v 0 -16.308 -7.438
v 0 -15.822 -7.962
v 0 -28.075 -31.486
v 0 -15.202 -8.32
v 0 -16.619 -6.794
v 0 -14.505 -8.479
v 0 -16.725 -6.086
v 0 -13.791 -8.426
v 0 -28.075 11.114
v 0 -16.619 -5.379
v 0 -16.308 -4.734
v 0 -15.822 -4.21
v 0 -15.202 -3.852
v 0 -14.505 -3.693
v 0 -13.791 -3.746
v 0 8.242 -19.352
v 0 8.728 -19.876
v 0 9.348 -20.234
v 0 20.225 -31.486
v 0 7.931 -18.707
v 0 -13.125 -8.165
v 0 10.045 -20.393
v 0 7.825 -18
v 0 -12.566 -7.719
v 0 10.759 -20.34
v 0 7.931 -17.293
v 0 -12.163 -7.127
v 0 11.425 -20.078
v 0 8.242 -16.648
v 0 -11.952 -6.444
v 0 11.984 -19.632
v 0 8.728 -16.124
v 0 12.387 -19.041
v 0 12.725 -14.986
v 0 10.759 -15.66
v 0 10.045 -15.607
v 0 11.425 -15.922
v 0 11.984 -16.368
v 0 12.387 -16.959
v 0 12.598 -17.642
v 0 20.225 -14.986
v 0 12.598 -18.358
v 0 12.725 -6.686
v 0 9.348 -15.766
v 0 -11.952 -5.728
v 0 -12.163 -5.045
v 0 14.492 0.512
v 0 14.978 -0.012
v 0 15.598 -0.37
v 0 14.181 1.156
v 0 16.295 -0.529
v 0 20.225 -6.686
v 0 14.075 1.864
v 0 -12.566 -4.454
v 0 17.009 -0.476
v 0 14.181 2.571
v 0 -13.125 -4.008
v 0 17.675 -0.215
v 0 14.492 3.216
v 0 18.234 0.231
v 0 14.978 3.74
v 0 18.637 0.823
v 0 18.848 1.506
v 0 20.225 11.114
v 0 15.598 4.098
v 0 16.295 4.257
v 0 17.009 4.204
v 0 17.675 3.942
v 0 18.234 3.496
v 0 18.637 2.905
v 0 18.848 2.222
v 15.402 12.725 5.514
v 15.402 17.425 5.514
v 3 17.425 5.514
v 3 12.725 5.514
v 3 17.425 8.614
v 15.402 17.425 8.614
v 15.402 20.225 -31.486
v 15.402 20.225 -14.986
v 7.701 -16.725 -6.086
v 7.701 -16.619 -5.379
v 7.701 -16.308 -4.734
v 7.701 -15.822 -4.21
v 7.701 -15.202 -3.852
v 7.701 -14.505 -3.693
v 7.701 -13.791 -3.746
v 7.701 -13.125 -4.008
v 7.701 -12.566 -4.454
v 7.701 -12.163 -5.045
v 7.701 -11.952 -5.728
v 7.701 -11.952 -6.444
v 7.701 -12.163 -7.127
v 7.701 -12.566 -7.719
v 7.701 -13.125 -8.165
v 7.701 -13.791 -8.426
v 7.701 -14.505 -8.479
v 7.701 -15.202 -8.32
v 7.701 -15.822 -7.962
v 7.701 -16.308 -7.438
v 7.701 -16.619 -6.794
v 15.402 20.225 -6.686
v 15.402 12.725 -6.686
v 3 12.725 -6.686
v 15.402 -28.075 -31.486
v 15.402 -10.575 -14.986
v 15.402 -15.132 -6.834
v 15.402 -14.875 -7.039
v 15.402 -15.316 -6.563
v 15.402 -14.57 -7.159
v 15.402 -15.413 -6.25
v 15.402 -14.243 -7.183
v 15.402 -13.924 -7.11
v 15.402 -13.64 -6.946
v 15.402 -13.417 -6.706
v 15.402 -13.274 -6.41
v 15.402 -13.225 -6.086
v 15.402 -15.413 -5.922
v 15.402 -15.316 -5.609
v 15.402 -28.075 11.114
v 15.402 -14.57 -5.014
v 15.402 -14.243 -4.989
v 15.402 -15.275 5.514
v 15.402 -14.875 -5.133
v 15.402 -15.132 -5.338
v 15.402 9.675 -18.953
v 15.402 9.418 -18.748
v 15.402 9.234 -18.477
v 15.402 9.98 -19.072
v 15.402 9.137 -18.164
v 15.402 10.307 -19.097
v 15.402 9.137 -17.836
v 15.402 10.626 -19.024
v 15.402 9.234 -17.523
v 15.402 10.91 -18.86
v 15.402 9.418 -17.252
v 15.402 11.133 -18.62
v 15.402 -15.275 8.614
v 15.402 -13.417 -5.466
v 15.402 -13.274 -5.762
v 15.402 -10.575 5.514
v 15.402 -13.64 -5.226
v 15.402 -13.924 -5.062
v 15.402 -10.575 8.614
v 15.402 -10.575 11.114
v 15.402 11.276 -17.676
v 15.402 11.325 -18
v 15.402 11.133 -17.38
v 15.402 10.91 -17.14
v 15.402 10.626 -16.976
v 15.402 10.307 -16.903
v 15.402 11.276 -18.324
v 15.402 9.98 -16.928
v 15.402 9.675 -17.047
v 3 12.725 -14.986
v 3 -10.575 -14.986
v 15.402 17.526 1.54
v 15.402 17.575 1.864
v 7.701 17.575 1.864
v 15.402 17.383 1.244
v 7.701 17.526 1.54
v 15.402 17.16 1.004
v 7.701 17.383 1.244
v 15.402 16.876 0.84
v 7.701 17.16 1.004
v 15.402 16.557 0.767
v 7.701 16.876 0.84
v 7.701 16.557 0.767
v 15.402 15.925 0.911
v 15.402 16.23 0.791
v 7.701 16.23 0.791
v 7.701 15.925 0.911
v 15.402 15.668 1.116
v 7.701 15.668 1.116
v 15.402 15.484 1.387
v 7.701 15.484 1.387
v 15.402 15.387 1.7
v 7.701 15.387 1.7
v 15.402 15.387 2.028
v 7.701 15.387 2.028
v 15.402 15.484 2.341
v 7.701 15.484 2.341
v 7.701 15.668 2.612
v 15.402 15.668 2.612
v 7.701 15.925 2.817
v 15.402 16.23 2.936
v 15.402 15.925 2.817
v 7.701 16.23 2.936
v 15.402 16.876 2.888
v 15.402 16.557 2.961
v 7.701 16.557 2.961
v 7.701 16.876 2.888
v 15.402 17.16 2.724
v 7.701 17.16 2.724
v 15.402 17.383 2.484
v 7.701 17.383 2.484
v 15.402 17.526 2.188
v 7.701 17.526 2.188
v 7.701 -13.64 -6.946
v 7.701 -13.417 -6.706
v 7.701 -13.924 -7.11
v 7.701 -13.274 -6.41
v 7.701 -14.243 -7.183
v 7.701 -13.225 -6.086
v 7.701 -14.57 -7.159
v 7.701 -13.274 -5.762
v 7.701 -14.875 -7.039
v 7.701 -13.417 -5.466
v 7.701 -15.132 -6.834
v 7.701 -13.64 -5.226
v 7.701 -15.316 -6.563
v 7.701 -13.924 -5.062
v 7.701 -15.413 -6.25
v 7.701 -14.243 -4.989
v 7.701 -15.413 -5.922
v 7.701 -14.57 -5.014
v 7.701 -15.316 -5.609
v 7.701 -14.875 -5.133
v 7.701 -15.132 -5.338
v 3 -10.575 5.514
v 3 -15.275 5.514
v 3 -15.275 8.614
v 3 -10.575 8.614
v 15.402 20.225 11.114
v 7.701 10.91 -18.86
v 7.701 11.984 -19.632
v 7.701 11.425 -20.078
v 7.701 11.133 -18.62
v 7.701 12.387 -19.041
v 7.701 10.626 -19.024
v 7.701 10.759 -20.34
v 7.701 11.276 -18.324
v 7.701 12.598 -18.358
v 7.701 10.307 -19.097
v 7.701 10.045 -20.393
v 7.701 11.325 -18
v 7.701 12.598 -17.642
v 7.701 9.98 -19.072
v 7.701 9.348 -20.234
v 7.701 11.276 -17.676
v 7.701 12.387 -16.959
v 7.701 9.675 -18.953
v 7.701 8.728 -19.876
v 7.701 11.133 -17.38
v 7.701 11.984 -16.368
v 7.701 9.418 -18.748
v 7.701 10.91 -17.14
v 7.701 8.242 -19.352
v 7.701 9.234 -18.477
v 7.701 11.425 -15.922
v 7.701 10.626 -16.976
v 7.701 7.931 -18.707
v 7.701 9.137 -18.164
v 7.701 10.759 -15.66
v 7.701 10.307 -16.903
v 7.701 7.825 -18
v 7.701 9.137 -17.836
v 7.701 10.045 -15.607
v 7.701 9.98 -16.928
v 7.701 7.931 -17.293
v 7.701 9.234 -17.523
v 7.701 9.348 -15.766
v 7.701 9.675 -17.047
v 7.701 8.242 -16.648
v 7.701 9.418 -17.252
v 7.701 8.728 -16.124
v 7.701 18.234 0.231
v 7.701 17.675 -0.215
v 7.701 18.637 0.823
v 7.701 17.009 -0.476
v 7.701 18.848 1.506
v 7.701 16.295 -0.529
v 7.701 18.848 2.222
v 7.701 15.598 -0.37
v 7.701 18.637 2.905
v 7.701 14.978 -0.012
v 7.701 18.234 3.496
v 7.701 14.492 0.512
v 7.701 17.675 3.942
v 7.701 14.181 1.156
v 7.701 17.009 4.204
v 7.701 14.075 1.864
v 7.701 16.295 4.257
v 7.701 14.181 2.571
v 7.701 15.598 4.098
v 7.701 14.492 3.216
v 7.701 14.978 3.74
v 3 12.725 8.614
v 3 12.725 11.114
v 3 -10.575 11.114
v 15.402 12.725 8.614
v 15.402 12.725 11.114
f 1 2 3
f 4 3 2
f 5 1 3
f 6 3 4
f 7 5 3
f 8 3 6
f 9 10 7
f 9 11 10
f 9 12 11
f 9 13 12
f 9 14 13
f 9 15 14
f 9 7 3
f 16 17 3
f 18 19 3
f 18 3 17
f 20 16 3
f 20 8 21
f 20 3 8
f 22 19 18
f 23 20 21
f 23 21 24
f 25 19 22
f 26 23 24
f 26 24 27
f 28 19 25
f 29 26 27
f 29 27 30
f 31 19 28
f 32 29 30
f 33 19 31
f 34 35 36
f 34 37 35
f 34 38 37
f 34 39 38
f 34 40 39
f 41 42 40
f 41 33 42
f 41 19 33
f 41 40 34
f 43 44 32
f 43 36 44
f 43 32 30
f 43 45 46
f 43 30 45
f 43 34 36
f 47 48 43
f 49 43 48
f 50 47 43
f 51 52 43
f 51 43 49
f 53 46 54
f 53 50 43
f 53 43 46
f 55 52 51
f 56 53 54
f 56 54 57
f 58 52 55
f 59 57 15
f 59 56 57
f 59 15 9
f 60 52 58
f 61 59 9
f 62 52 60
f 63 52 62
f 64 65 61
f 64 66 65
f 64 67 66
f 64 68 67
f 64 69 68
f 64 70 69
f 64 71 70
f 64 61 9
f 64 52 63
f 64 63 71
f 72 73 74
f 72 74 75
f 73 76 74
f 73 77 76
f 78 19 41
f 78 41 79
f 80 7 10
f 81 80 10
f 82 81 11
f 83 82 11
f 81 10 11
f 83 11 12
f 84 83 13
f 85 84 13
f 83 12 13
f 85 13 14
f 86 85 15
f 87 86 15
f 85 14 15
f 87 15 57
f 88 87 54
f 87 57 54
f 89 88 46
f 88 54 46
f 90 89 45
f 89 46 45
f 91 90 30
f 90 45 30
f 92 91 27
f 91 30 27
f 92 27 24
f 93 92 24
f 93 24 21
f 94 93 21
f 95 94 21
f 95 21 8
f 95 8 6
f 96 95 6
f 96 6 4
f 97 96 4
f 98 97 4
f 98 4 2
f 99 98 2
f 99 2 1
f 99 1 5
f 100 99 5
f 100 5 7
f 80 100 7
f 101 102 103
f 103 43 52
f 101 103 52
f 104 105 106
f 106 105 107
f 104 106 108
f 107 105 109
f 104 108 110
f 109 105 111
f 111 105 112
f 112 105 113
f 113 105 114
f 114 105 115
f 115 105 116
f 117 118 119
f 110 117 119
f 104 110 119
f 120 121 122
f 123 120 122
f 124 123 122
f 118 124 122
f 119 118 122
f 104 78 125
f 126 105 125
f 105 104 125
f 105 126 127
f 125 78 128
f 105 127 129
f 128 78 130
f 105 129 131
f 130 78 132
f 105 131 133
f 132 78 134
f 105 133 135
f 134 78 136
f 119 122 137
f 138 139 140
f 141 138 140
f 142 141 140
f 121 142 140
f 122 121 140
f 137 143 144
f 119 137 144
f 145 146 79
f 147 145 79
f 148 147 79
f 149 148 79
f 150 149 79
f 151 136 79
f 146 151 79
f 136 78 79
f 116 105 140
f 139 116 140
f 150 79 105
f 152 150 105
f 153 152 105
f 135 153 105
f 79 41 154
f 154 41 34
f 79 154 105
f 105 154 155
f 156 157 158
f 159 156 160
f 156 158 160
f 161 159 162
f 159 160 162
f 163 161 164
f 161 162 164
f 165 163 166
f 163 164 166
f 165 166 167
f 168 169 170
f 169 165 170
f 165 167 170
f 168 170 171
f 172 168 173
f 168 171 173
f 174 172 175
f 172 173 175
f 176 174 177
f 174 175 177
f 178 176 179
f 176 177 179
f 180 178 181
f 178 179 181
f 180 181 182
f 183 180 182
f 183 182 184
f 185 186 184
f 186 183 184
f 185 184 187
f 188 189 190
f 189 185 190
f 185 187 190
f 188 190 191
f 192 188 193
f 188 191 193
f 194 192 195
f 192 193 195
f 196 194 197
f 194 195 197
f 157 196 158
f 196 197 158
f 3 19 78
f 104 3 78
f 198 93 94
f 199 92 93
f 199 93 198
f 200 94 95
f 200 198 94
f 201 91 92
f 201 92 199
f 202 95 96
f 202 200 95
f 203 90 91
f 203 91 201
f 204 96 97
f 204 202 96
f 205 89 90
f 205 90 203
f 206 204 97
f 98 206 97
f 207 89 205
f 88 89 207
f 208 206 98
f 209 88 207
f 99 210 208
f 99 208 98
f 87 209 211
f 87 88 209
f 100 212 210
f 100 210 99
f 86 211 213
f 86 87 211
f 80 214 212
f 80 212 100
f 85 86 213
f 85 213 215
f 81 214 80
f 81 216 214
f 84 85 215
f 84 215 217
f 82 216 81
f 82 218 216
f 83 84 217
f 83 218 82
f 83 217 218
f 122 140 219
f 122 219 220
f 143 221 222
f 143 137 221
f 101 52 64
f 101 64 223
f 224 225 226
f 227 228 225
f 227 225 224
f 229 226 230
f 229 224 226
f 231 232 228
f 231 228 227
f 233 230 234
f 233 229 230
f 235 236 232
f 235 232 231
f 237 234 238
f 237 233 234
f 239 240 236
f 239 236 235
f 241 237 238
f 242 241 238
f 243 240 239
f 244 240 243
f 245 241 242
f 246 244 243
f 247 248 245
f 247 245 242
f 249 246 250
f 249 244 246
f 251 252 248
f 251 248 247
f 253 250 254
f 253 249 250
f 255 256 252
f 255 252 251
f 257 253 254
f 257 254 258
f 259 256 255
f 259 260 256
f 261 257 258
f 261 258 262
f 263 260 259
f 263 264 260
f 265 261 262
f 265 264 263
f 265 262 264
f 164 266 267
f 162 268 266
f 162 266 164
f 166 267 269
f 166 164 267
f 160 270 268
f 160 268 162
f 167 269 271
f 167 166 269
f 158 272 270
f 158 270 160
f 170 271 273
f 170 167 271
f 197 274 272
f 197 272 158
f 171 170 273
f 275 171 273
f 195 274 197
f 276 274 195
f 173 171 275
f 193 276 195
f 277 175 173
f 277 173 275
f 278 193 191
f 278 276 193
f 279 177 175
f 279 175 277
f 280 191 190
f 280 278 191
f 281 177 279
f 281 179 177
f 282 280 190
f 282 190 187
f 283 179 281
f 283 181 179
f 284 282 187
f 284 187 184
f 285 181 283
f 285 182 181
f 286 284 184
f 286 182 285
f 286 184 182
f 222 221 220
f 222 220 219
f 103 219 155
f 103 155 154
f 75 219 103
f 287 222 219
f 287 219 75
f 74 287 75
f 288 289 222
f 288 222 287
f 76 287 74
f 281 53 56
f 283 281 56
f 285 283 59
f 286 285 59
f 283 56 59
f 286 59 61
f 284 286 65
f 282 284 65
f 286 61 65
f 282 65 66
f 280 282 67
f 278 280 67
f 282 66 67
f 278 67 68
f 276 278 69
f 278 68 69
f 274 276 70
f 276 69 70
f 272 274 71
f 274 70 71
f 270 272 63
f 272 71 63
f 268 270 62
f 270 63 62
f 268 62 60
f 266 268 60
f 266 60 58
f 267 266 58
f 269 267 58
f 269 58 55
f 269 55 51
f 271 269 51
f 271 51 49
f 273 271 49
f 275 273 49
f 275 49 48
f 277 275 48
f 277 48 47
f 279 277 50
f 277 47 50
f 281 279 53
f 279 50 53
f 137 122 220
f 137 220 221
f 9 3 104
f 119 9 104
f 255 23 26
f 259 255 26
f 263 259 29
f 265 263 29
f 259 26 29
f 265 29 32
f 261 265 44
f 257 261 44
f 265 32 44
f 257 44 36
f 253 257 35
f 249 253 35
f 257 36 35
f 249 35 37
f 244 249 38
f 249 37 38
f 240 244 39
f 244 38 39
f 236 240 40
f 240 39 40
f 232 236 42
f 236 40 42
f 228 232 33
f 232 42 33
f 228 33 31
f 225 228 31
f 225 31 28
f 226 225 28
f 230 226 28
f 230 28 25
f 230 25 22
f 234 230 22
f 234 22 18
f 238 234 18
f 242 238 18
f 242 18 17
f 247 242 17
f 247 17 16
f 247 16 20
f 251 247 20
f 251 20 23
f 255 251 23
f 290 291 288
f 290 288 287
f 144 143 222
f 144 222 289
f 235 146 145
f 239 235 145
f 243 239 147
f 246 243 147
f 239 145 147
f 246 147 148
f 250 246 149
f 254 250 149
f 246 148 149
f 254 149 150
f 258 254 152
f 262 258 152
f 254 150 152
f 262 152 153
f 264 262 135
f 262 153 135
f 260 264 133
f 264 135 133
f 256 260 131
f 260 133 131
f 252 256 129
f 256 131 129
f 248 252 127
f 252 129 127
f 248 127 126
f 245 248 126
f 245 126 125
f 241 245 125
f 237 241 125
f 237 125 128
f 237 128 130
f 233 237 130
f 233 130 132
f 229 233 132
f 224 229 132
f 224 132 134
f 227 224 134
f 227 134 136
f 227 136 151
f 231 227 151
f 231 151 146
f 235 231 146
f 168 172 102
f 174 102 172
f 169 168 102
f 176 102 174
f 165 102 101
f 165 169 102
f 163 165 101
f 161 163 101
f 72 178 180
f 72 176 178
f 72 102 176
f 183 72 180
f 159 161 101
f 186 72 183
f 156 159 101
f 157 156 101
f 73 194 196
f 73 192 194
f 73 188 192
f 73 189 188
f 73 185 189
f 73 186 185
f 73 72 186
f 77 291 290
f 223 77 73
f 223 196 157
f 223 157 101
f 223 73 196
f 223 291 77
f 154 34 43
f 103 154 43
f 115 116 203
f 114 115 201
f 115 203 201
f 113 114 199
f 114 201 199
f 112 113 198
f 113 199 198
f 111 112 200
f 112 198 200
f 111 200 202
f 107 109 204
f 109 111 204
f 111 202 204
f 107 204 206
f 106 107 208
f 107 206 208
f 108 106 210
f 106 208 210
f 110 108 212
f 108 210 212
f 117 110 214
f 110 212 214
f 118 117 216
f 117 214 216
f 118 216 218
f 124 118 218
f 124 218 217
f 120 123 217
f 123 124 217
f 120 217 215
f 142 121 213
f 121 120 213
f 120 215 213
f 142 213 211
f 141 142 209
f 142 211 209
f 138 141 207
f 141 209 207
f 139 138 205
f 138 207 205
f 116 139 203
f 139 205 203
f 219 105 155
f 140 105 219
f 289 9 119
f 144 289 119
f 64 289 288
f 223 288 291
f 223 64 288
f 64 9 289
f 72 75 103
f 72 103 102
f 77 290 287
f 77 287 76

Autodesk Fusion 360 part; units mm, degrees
sketch "Sketch1" plane through (0, 0, 0) normal (1, 0, 0) x (0, 1, 0)
  line L0 (-18.1754, 12.6139) -> (20.3246, 12.6139)
  line L1 (20.3246, 12.6139) -> (20.3246, -16.0861)
  line L2 (20.3246, -16.0861) -> (-18.1754, -16.0861)
  line L3 (-18.1754, -16.0861) -> (-18.1754, 12.6139)
  line L4 (20.3246, -10.1861) -> (12.7246, -10.1861)
  line L5 (12.7246, -10.1861) -> (12.7246, -1.8861)
  line L6 (12.7246, -1.8861) -> (20.3246, -1.8861)
  line L7 (20.3246, -1.8861) -> (20.3246, -10.1861)
  circle A0 centre (16.4746, 1.8639) radius 1.1
  circle A1 centre (-14.3254, -6.0861) radius 1.1
  dimension "d2" = 38.5
  dimension "d3" = 28.7
  dimension "d4" = 7.6
  dimension "d5" = 8.3
  dimension "d6" = 5.9
  dimension "d7" = 2.2
  dimension "d8" = 3.75
  dimension "d9" = 3.85
  dimension "d10" = 2.2
  dimension "d11" = 10
  dimension "d12" = 3.85
extrude "Extrude1" add sketch "Sketch1" along normal blind 15.402 contours L0 L1 L2 L3 L4 L5 L6
sketch "Sketch2" plane through (15.402, 0, 0) normal (1, 0, 0) x (0, 1, 0)
  circle A0 centre (-14.3254, -6.0861) radius 1.1
  circle A1 centre (16.4746, 1.8639) radius 1.1
  line L0 (20.3246, -10.1861) -> (12.7246, -10.1861)
  line L1 (12.7246, -10.1861) -> (12.7246, -1.8861)
  line L2 (12.7246, -1.8861) -> (20.3246, -1.8861)
  line L3 (20.3246, -1.8861) -> (20.3246, 12.6139)
  line L4 (20.3246, 12.6139) -> (-18.1754, 12.6139)
  line L5 (-18.1754, 12.6139) -> (-18.1754, -16.0861)
  line L6 (-18.1754, -16.0861) -> (20.3246, -16.0861)
  line L7 (20.3246, -16.0861) -> (20.3246, -10.1861)
  line L8 (12.7246, -10.1861) -> (-10.5754, -10.1861)
  line L9 (-10.5754, -10.1861) -> (-10.5754, 12.6139)
  line L10 (-10.5754, 12.6139) -> (12.7246, 12.6139)
  line L11 (12.7246, 12.6139) -> (12.7246, -10.1861)
  line L12 (12.7246, 8.6139) -> (17.4246, 8.6139)
  line L13 (17.4246, 8.6139) -> (17.4246, 5.5139)
  line L14 (17.4246, 5.5139) -> (12.7246, 5.5139)
  line L15 (12.7246, 5.5139) -> (12.7246, 8.6139)
  line L16 (-10.5754, 5.5139) -> (-15.2754, 5.5139)
  line L17 (-15.2754, 5.5139) -> (-15.2754, 8.6139)
  line L18 (-15.2754, 8.6139) -> (-10.5754, 8.6139)
  line L19 (-10.5754, 8.6139) -> (-10.5754, 5.5139)
  dimension "d15" = 23.3
  dimension "d16" = 4.7
  dimension "d17" = 3.1
  dimension "d18" = 21.6
  dimension "d19" = 4.7
  dimension "d20" = 3.1
  dimension "d21" = 21.6
extrude "Extrude2" cut sketch "Sketch2" against normal blind 12.402 contours L1 L4 L8 L9 L10 L11 L15 L19 | L11 L12 L13 L14 L15 | L9 L16 L17 L18 L19
sketch "Sketch3" plane through (0, 0, 0) normal (-1, 0, 0) x (0, -1, 0)
  circle A0 centre (14.3254, -6.0861) radius 1.1
  circle A1 centre (-16.4746, 1.8639) radius 1.1
  line L0 (-12.7246, -10.1861) -> (-20.3246, -10.1861)
  line L1 (-20.3246, -10.1861) -> (-20.3246, -16.0861)
  line L2 (-20.3246, -16.0861) -> (18.1754, -16.0861)
  line L3 (18.1754, -16.0861) -> (18.1754, 12.6139)
  line L4 (18.1754, 12.6139) -> (-20.3246, 12.6139)
  line L5 (-20.3246, 12.6139) -> (-20.3246, -1.8861)
  line L6 (-20.3246, -1.8861) -> (-12.7246, -1.8861)
  line L7 (-12.7246, -1.8861) -> (-12.7246, -10.1861)
  circle A2 centre (-16.4746, 1.8639) radius 2.4
  circle A3 centre (14.3254, -6.0861) radius 2.4
  dimension "d24" = 4.8
  dimension "d25" = 4.8
extrude "Extrude3" cut sketch "Sketch3" against normal blind 7.701 contours A2
extrude "Extrude4" cut sketch "Sketch3" against normal blind 7.701 contours A3
extrude "Extrude5" cut 1 faces at (11.268, 7.4913, -10.1861) along direction (0, 0, -1) blind 4.8
extrude "Extrude6" add 1 faces at (5.134, 7.4913, -16.0861) along direction (0, 0, -1) blind 5
extrude "Extrude7" cut 1 faces at (5.134, 7.4913, -21.0861) along direction (0, 0, 1) blind 0.1
extrude "Extrude8" cut 1 faces at (5.134, -18.1754, 1.4139) along direction (0, 1, 0) blind 0.1
extrude "Extrude9" cut 1 faces at (5.134, 20.3246, 7.7806) along direction (0, -1, 0) blind 0.1
extrude "Extrude10" cut 1 faces at (5.134, 20.3246, -18.9861) along direction (0, -1, 0) blind 0.1
extrude "Extrude11" cut 1 faces at (6.134, 17.7246, 12.6139) along direction (0, 0, -1) blind 1
extrude "Extrude12" cut 1 faces at (6.134, 17.7246, 11.6139) along direction (0, 0, -1) blind 0.5
sketch "Sketch4" plane through (15.402, 0, 0) normal (1, 0, 0) x (0, 1, 0)
  line L0 (-10.5754, 11.1139) -> (-18.0754, 11.1139)
  line L1 (-18.0754, 11.1139) -> (-18.0754, -20.9861)
  line L2 (-18.0754, -20.9861) -> (20.2246, -20.9861)
  line L3 (20.2246, -20.9861) -> (20.2246, -14.9861)
  line L4 (20.2246, -14.9861) -> (-10.5754, -14.9861)
  line L5 (-10.5754, -14.9861) -> (-10.5754, 5.5139)
  line L6 (-10.5754, 5.5139) -> (-15.2754, 5.5139)
  line L7 (-15.2754, 5.5139) -> (-15.2754, 8.6139)
  line L8 (-15.2754, 8.6139) -> (-10.5754, 8.6139)
  line L9 (-10.5754, 8.6139) -> (-10.5754, 11.1139)
  circle A0 centre (-14.3254, -6.0861) radius 1.1
  circle A1 centre (10.2246, -18) radius 1.1
  dimension "d46" = 2.2
  dimension "d72" = 10
extrude "Extrude13" cut sketch "Sketch4" against normal blind 15.402 contours A1
sketch "Sketch5" plane through (0, 0, 0) normal (-1, 0, 0) x (0, -1, 0)
  circle A0 centre (-10.2246, -18) radius 1.1
  line L0 (18.0754, 11.1139) -> (-20.2246, 11.1139)
  line L1 (-20.2246, 11.1139) -> (-20.2246, -1.8861)
  line L2 (-20.2246, -1.8861) -> (-12.7246, -1.8861)
  line L3 (-12.7246, -1.8861) -> (-12.7246, -14.9861)
  line L4 (-12.7246, -14.9861) -> (-20.2246, -14.9861)
  line L5 (-20.2246, -14.9861) -> (-20.2246, -20.9861)
  line L6 (-20.2246, -20.9861) -> (18.0754, -20.9861)
  line L7 (18.0754, -20.9861) -> (18.0754, 11.1139)
  circle A1 centre (14.3254, -6.0861) radius 2.4
  circle A2 centre (-16.4746, 1.8639) radius 2.4
  circle A3 centre (-10.2246, -18) radius 2.4
  dimension "d49" = 4.8
extrude "Extrude14" cut sketch "Sketch5" against normal blind 7.701 contours A3
extrude "Extrude15" add 1 faces at (6.134, 17.7246, -1.8861) along direction (0, 0, -1) blind 4.8
extrude "Extrude16" add 1 faces at (5.134, 7.4579, -20.9861) along direction (0, 0, -1) blind 0.5
extrude "Extrude17" add 1 faces at (5.134, 7.4579, -21.4861) along direction (0, 0, -1) blind 10
extrude "Extrude18" add 1 faces at (5.134, -18.0754, -3.0861) along direction (0, -1, 0) blind 10
